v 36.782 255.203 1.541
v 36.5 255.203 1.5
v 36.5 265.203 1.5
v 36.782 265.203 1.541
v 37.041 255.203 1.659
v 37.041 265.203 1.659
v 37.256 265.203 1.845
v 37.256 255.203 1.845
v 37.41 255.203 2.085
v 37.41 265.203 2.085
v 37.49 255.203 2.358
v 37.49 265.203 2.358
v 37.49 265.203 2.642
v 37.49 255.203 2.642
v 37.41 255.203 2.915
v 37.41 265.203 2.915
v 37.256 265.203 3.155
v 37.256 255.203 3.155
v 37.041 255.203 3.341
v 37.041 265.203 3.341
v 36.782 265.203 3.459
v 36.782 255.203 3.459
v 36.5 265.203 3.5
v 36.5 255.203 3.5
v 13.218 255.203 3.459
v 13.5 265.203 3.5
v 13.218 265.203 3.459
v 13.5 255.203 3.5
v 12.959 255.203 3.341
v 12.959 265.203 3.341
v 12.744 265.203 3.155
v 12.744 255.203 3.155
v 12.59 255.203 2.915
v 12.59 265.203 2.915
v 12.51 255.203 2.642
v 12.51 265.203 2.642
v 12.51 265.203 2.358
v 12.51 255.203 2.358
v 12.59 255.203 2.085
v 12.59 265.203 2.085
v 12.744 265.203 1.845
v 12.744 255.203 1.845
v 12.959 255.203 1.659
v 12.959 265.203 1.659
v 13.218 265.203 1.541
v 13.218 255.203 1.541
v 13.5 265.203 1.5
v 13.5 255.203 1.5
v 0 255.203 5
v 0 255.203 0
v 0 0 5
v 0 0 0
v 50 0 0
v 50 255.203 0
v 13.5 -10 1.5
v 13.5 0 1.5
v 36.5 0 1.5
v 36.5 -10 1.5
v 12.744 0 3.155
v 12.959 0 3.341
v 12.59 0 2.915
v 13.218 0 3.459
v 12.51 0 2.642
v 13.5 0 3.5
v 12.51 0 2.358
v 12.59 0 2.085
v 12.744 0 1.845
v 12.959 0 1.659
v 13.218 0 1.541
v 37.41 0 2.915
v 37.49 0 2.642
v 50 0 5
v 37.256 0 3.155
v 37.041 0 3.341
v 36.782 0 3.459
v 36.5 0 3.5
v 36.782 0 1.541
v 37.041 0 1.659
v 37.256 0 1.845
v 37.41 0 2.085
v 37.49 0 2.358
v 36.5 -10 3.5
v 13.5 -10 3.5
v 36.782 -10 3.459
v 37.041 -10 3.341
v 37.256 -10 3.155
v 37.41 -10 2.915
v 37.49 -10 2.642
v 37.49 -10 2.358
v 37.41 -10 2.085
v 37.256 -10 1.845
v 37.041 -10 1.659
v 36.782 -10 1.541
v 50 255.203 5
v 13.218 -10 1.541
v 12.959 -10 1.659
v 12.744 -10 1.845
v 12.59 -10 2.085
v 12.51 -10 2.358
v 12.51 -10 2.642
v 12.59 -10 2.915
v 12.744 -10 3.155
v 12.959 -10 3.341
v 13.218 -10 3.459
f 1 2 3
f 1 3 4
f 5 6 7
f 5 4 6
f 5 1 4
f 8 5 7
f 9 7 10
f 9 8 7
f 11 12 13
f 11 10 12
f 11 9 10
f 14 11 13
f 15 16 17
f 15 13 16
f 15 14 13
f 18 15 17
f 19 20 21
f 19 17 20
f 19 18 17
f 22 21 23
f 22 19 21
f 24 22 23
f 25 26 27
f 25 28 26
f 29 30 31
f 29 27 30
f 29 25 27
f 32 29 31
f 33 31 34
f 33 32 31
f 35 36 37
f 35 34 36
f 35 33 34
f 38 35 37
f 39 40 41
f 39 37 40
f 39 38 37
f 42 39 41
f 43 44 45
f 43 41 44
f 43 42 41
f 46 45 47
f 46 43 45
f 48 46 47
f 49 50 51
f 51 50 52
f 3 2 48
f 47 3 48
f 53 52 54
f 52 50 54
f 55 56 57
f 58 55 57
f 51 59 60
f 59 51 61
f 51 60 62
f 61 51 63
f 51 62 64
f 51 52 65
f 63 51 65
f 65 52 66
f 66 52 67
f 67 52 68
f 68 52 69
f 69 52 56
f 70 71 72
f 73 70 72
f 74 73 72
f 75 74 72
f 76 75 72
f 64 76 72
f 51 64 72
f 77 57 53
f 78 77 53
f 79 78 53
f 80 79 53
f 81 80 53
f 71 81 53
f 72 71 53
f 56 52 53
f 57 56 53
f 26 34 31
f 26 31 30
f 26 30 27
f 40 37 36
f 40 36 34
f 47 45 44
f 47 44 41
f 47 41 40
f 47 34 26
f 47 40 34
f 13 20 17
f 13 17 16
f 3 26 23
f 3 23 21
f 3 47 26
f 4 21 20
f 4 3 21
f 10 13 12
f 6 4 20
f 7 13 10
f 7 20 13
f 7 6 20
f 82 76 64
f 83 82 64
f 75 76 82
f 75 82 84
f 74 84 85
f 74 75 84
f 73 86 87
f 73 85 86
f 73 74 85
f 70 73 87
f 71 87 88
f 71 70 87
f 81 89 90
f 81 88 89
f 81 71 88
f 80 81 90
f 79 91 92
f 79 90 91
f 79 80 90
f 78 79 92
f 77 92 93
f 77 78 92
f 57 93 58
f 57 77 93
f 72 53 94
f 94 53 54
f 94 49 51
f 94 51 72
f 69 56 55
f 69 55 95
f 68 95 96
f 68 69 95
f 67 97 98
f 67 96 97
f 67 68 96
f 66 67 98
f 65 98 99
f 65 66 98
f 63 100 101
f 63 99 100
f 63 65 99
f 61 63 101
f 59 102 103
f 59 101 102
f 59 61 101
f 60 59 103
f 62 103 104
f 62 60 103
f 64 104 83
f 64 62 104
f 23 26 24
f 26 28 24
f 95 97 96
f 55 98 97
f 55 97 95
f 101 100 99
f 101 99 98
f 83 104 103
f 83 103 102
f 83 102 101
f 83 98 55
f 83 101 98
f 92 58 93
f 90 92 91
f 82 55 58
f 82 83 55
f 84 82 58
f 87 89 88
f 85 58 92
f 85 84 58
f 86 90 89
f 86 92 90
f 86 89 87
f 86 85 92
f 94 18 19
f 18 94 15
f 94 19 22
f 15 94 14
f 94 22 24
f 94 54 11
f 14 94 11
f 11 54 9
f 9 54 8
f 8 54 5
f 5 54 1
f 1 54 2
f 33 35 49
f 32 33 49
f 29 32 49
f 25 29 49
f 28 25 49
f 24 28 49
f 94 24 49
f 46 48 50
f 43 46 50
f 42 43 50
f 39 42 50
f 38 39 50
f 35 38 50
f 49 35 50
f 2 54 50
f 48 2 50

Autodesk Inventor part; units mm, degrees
ref_plane "YZ Plane" through (0, 0, 0) normal (1, 0, 0) x (0, 1, 0)
ref_plane "XZ Plane" through (0, 0, 0) normal (0, 1, 0) x (-1, 0, 0)
ref_plane "XY Plane" through (0, 0, 0) normal (0, 0, 1) x (1, 0, 0)
sketch "Sketch1" plane through (0, 0, 0) normal (0, 0, 1) x (1, 0, 0)
  line L0 (0, 0) -> (50, 0)
  line L1 (50, 0) -> (50, 255.203)
  line L2 (50, 255.203) -> (0, 255.203)
  line L3 (0, 255.203) -> (0, 0)
  dimension "d0" = 50
  dimension "d1" = 255.203
extrude "Extrusion1" add sketch "Sketch1" along normal blind 5
sketch "Sketch2" plane through (0, 0, 0) normal (0, -1, 0) x (1, 0, 0)
  line L0 (36.5, 2.5) -> (13.5, 2.5) construction
  line L1 (36.5, 3.5) -> (13.5, 3.5)
  line L2 (13.5, 1.5) -> (36.5, 1.5)
  arc A0 (36.5, 1.5) -> (36.5, 3.5) centre (36.5, 2.5) ccw
  arc A1 (13.5, 3.5) -> (13.5, 1.5) centre (13.5, 2.5) ccw
  line L3 (50, 0) -> (50, 5) projected
  point P0 (0, 0)
  point P1 (25, 2.5)
  point P2 (50, 2.5)
  point P3 (12.5, 2.5)
  point P4 (37.5, 2.5)
  dimension "d4" = 2
  dimension "d5" = 25
  dimension "d6" = 25
  dimension "d9" = 2.5
extrude "Extrusion2" add sketch "Sketch2" along normal blind 10
sketch "Sketch3" plane through (0, 255.203, 0) normal (0, 1, 0) x (1, 0, 0)
  line L0 (36.5, -2.5) -> (13.5, -2.5) construction
  line L1 (36.5, -1.5) -> (13.5, -1.5)
  line L2 (13.5, -3.5) -> (36.5, -3.5)
  arc A0 (36.5, -3.5) -> (36.5, -1.5) centre (36.5, -2.5) ccw
  arc A1 (13.5, -1.5) -> (13.5, -3.5) centre (13.5, -2.5) ccw
  point P0 (0, 0)
  point P1 (25, -2.5)
  point P2 (12.5, -2.5)
  point P3 (37.5, -2.5)
  dimension "d10" = 2
  dimension "d12" = 25
  dimension "d14" = 2.5
  dimension "d15" = 25
extrude "Extrusion3" add sketch "Sketch3" along normal blind 10
